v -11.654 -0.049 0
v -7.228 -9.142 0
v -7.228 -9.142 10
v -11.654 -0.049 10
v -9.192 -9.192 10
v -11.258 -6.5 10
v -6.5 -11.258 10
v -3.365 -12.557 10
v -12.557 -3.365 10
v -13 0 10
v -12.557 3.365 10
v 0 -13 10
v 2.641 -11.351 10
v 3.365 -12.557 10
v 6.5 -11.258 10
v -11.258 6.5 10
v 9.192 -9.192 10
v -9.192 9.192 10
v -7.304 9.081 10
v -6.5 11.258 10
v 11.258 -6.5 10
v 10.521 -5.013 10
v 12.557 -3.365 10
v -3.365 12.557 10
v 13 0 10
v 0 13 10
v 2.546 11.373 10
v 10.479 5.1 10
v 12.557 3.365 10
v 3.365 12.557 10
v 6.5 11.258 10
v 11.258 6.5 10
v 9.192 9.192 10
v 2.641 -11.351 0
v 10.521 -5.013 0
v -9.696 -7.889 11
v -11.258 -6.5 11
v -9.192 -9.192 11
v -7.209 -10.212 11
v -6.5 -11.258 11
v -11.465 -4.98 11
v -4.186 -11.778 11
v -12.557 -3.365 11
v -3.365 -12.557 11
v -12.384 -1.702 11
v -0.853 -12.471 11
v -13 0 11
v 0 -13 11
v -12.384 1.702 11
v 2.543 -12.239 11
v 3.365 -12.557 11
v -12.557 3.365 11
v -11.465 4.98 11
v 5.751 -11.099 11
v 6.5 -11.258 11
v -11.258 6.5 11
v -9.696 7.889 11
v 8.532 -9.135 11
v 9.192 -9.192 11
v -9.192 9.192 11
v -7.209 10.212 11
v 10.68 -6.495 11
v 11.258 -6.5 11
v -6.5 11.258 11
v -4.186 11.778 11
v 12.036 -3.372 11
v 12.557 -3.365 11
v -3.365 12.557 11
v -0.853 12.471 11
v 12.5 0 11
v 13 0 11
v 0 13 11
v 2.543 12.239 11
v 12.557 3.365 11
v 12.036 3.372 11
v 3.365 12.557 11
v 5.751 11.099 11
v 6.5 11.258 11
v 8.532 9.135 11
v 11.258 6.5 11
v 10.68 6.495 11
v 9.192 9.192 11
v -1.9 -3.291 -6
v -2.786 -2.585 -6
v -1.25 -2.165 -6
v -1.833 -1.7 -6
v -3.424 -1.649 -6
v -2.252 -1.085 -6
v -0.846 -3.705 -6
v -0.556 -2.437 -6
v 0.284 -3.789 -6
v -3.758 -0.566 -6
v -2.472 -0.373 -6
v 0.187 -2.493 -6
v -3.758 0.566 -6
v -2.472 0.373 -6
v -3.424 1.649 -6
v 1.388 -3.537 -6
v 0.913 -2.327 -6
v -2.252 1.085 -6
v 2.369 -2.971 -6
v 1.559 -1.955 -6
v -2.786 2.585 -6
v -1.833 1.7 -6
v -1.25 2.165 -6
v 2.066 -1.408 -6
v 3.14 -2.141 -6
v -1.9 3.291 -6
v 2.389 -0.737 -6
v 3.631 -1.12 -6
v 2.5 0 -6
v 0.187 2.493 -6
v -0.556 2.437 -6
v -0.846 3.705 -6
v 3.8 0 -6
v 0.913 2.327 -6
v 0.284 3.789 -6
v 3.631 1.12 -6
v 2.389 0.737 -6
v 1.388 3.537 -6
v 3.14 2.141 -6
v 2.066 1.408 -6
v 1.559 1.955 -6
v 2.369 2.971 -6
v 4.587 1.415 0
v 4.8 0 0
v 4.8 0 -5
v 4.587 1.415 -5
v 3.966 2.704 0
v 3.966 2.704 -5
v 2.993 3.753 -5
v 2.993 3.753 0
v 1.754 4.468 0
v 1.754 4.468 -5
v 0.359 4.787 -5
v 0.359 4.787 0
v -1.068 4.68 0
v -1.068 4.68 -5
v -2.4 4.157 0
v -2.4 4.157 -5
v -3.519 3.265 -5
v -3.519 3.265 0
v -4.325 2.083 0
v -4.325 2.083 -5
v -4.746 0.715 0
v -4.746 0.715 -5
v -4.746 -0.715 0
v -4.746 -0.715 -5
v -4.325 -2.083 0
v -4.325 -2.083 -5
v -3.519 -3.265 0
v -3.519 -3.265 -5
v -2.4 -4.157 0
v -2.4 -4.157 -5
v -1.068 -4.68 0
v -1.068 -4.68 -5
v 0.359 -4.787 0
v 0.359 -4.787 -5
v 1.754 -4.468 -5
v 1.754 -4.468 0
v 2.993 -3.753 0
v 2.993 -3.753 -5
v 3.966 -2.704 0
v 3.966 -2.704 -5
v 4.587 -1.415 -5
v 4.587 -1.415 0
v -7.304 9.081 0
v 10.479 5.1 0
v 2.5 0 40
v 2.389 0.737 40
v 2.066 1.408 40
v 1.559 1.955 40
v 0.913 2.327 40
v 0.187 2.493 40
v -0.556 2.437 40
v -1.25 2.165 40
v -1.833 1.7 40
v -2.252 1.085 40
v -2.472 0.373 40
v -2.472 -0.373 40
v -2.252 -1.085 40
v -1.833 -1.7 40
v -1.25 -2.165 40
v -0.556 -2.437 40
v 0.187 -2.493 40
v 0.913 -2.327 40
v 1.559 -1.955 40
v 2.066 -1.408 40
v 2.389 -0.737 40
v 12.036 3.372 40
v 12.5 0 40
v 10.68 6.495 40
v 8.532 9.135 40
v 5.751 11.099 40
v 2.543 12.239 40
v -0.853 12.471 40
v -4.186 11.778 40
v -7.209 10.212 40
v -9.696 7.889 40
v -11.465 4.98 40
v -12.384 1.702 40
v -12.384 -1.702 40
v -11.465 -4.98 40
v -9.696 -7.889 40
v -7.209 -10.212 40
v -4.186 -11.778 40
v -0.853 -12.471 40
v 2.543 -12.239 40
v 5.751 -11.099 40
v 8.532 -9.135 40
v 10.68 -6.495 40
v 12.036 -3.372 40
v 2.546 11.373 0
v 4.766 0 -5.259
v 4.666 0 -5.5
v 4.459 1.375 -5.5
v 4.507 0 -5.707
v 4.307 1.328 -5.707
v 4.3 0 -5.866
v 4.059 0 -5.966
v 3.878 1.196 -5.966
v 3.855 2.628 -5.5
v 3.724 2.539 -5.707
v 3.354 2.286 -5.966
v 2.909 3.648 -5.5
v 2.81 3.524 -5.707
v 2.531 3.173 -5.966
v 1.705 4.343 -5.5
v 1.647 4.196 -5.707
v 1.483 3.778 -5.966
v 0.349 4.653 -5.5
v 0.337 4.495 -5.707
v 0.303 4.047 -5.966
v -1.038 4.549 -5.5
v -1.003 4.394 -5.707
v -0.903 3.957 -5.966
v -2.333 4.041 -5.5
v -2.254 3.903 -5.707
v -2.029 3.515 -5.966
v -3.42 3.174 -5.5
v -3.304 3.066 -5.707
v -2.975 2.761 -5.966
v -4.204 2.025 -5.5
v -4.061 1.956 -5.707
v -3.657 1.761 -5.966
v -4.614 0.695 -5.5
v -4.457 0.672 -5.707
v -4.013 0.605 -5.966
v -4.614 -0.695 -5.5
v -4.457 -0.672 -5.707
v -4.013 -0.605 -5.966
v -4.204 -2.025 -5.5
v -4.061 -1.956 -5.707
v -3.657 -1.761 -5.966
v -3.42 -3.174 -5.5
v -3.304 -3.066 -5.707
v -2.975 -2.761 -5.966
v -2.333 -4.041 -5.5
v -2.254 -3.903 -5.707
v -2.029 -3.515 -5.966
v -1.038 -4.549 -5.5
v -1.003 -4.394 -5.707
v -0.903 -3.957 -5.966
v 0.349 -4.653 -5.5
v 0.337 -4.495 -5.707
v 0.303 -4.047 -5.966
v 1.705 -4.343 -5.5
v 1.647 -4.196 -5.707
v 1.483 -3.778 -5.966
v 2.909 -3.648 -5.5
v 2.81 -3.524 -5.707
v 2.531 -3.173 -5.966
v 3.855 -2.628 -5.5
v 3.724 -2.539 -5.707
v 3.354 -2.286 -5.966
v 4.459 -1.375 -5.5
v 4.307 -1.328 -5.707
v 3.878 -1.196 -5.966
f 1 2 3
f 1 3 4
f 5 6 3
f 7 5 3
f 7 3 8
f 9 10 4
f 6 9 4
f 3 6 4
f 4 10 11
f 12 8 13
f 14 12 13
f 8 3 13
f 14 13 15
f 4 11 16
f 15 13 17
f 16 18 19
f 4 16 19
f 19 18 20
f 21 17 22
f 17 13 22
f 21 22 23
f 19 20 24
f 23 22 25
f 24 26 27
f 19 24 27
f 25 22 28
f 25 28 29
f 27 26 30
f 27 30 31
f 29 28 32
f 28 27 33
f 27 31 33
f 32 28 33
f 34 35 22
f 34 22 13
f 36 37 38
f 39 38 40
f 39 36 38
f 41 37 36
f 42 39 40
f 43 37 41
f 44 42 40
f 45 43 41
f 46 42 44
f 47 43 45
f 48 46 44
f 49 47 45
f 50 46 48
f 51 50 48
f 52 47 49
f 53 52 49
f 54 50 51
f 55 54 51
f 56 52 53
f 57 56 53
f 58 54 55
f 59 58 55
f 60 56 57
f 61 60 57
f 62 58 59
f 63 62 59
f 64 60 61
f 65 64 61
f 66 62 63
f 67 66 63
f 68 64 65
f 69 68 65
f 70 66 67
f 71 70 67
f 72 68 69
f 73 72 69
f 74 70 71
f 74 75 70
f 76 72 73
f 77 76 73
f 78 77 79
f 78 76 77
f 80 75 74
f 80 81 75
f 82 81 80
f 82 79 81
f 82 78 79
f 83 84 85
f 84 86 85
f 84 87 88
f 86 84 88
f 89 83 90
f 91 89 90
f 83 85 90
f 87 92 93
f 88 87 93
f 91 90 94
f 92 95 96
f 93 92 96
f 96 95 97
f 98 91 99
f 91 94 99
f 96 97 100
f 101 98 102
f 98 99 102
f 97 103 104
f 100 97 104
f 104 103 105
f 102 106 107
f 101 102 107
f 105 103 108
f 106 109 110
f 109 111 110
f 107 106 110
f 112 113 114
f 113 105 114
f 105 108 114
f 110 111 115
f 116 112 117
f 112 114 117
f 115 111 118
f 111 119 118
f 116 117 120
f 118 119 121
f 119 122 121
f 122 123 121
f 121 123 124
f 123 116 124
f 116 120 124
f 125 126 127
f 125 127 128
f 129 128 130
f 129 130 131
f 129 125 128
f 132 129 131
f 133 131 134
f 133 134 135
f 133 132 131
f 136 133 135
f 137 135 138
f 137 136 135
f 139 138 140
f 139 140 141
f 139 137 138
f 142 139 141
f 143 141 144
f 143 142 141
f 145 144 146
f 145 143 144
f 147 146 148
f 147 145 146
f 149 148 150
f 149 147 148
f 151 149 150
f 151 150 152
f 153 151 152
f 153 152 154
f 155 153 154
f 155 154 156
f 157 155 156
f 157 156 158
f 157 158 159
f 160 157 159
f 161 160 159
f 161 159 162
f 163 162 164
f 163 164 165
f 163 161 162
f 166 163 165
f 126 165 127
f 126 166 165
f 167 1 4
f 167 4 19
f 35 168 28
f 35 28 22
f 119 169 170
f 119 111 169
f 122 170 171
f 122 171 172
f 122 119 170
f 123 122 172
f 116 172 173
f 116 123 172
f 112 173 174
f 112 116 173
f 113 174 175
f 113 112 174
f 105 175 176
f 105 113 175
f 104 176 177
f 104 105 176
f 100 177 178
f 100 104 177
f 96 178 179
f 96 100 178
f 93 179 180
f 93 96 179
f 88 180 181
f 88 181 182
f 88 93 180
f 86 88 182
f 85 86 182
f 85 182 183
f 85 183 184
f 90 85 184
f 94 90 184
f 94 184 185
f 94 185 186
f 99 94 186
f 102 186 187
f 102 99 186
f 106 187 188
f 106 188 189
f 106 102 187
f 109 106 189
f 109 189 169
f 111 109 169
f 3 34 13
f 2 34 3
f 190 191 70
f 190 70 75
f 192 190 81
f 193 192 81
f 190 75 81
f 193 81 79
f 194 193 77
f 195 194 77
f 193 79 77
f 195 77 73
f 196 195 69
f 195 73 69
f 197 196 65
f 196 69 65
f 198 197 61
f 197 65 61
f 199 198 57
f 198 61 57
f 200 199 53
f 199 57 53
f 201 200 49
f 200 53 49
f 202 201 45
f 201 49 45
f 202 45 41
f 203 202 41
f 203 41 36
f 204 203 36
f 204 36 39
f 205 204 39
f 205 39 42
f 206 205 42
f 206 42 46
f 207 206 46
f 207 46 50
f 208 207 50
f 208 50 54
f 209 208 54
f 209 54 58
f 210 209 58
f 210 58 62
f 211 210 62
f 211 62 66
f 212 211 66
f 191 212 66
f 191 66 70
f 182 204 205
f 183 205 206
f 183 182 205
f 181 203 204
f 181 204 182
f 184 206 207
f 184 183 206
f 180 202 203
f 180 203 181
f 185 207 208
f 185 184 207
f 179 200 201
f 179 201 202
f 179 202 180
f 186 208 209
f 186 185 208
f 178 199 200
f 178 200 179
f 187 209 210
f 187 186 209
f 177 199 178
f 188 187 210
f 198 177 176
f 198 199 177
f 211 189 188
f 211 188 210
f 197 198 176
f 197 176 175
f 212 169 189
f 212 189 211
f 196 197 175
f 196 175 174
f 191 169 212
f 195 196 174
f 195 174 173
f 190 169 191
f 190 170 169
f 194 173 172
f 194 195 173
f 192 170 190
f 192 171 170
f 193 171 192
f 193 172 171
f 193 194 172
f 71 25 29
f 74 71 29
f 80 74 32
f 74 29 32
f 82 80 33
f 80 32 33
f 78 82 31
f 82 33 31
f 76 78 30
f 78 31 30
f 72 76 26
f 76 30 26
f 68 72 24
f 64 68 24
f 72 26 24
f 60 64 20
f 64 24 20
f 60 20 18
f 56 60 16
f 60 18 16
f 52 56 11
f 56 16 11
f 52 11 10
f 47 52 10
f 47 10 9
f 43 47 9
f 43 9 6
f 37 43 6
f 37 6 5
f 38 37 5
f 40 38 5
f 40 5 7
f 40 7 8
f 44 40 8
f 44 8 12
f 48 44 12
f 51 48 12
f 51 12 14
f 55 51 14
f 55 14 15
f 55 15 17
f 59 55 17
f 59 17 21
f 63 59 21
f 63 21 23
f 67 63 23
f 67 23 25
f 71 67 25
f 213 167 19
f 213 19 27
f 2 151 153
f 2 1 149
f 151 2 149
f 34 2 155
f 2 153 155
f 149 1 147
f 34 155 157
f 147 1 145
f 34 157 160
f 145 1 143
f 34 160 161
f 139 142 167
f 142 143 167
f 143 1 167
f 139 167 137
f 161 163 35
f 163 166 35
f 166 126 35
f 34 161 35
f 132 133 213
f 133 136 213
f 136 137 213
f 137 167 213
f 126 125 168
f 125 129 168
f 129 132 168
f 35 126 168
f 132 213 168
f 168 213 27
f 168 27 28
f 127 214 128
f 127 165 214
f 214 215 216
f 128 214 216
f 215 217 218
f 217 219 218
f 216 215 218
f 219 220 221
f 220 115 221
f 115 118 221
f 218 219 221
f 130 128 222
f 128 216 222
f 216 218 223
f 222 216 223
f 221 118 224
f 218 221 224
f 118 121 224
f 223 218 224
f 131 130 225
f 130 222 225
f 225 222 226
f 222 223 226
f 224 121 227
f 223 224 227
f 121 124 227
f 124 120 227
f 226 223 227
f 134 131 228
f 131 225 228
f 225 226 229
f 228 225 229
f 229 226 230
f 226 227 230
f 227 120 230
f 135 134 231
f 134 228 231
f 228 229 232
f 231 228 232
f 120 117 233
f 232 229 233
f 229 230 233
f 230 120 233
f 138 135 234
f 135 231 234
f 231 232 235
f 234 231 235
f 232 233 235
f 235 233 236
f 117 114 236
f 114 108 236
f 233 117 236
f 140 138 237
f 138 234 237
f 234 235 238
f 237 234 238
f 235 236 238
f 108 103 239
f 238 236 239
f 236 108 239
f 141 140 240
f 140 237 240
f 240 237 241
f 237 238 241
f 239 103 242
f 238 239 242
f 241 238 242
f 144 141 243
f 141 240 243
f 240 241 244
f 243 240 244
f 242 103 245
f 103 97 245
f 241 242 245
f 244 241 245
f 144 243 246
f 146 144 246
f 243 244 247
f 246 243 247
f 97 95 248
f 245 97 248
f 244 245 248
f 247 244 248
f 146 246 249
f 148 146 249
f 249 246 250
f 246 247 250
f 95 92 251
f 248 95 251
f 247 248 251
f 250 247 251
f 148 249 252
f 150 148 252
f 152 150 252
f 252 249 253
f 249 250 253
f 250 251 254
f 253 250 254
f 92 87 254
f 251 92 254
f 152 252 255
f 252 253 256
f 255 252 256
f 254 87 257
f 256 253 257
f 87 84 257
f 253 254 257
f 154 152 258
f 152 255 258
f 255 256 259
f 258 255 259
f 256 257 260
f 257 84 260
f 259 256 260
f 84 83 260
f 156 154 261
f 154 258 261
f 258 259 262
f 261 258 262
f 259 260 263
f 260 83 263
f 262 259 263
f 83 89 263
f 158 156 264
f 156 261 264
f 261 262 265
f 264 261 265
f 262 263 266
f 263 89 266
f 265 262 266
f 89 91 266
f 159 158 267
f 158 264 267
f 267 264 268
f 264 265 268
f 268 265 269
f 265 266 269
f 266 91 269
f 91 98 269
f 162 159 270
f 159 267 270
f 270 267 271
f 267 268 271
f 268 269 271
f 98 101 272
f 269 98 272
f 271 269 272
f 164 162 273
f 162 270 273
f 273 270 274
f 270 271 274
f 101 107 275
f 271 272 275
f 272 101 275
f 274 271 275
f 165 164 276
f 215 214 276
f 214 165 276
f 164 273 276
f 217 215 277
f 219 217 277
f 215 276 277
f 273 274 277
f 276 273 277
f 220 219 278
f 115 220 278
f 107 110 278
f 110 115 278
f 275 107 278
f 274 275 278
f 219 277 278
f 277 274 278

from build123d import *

# Parameters (mm, degrees)
F0_R     = 4.8
F0_R_2   = 2.5
F1_DEPTH = 6
F2_DEPTH = 40
F0_R_3   = 12.5
F3_DEPTH = 40
F4_DEPTH = 10
F0_R_4   = 13
F5_DEPTH = 11
F6_DEPTH = 10
F7_R     = 1


with BuildPart() as f1:
    # F0 (on Top) → F1 (new body)
    with BuildSketch(Plane.XY):
        Circle(F0_R)
        Circle(F0_R_2, mode=Mode.SUBTRACT)
    extrude(amount=-F1_DEPTH)

    # F0 (on Top) → F2 (join)
    with BuildSketch(Plane.XY):
        Polygon((2.640845, -11.350968), (10.521084, -5.012517), (10.478732, 5.100462), (2.545681, 11.372688), (-7.30432, 9.081049), (-11.654019, -0.048806), (-7.228004, -9.141909), align=None)
        Circle(F0_R, mode=Mode.SUBTRACT)
        Circle(F0_R)
        Circle(F0_R_2, mode=Mode.SUBTRACT)
    extrude(amount=F2_DEPTH)

    # F0 (on Top) → F3 (join)
    with BuildSketch(Plane.XY):
        Circle(F0_R_3)
        Polygon((10.478732, 5.100462), (10.521084, -5.012517), (2.640845, -11.350968), (-7.228004, -9.141909), (-11.654019, -0.048806), (-7.30432, 9.081049), (2.545681, 11.372688), align=None, mode=Mode.SUBTRACT)
    extrude(amount=F3_DEPTH)

    # F0 (on Top) → F4 (cut)
    with BuildSketch(Plane.XY):
        Circle(F0_R_3)
        Polygon((10.478732, 5.100462), (10.521084, -5.012517), (2.640845, -11.350968), (-7.228004, -9.141909), (-11.654019, -0.048806), (-7.30432, 9.081049), (2.545681, 11.372688), align=None, mode=Mode.SUBTRACT)
    extrude(amount=F4_DEPTH, mode=Mode.SUBTRACT)

    # F0 (on Top) → F5 (join)
    with BuildSketch(Plane.XY):
        Circle(F0_R_4)
        Circle(F0_R_3, mode=Mode.SUBTRACT)
    extrude(amount=F5_DEPTH)

    # F0 (on Top) → F6 (cut)
    with BuildSketch(Plane.XY):
        Circle(F0_R_4)
        Circle(F0_R_3, mode=Mode.SUBTRACT)
    extrude(amount=F6_DEPTH, mode=Mode.SUBTRACT)

    # F7
    f7_edges = [f1.edges().sort_by_distance(p)[0] for p in [
        (-4.8, 0, -6),
    ]]
    fillet(f7_edges, radius=F7_R)


solid = f1.part
